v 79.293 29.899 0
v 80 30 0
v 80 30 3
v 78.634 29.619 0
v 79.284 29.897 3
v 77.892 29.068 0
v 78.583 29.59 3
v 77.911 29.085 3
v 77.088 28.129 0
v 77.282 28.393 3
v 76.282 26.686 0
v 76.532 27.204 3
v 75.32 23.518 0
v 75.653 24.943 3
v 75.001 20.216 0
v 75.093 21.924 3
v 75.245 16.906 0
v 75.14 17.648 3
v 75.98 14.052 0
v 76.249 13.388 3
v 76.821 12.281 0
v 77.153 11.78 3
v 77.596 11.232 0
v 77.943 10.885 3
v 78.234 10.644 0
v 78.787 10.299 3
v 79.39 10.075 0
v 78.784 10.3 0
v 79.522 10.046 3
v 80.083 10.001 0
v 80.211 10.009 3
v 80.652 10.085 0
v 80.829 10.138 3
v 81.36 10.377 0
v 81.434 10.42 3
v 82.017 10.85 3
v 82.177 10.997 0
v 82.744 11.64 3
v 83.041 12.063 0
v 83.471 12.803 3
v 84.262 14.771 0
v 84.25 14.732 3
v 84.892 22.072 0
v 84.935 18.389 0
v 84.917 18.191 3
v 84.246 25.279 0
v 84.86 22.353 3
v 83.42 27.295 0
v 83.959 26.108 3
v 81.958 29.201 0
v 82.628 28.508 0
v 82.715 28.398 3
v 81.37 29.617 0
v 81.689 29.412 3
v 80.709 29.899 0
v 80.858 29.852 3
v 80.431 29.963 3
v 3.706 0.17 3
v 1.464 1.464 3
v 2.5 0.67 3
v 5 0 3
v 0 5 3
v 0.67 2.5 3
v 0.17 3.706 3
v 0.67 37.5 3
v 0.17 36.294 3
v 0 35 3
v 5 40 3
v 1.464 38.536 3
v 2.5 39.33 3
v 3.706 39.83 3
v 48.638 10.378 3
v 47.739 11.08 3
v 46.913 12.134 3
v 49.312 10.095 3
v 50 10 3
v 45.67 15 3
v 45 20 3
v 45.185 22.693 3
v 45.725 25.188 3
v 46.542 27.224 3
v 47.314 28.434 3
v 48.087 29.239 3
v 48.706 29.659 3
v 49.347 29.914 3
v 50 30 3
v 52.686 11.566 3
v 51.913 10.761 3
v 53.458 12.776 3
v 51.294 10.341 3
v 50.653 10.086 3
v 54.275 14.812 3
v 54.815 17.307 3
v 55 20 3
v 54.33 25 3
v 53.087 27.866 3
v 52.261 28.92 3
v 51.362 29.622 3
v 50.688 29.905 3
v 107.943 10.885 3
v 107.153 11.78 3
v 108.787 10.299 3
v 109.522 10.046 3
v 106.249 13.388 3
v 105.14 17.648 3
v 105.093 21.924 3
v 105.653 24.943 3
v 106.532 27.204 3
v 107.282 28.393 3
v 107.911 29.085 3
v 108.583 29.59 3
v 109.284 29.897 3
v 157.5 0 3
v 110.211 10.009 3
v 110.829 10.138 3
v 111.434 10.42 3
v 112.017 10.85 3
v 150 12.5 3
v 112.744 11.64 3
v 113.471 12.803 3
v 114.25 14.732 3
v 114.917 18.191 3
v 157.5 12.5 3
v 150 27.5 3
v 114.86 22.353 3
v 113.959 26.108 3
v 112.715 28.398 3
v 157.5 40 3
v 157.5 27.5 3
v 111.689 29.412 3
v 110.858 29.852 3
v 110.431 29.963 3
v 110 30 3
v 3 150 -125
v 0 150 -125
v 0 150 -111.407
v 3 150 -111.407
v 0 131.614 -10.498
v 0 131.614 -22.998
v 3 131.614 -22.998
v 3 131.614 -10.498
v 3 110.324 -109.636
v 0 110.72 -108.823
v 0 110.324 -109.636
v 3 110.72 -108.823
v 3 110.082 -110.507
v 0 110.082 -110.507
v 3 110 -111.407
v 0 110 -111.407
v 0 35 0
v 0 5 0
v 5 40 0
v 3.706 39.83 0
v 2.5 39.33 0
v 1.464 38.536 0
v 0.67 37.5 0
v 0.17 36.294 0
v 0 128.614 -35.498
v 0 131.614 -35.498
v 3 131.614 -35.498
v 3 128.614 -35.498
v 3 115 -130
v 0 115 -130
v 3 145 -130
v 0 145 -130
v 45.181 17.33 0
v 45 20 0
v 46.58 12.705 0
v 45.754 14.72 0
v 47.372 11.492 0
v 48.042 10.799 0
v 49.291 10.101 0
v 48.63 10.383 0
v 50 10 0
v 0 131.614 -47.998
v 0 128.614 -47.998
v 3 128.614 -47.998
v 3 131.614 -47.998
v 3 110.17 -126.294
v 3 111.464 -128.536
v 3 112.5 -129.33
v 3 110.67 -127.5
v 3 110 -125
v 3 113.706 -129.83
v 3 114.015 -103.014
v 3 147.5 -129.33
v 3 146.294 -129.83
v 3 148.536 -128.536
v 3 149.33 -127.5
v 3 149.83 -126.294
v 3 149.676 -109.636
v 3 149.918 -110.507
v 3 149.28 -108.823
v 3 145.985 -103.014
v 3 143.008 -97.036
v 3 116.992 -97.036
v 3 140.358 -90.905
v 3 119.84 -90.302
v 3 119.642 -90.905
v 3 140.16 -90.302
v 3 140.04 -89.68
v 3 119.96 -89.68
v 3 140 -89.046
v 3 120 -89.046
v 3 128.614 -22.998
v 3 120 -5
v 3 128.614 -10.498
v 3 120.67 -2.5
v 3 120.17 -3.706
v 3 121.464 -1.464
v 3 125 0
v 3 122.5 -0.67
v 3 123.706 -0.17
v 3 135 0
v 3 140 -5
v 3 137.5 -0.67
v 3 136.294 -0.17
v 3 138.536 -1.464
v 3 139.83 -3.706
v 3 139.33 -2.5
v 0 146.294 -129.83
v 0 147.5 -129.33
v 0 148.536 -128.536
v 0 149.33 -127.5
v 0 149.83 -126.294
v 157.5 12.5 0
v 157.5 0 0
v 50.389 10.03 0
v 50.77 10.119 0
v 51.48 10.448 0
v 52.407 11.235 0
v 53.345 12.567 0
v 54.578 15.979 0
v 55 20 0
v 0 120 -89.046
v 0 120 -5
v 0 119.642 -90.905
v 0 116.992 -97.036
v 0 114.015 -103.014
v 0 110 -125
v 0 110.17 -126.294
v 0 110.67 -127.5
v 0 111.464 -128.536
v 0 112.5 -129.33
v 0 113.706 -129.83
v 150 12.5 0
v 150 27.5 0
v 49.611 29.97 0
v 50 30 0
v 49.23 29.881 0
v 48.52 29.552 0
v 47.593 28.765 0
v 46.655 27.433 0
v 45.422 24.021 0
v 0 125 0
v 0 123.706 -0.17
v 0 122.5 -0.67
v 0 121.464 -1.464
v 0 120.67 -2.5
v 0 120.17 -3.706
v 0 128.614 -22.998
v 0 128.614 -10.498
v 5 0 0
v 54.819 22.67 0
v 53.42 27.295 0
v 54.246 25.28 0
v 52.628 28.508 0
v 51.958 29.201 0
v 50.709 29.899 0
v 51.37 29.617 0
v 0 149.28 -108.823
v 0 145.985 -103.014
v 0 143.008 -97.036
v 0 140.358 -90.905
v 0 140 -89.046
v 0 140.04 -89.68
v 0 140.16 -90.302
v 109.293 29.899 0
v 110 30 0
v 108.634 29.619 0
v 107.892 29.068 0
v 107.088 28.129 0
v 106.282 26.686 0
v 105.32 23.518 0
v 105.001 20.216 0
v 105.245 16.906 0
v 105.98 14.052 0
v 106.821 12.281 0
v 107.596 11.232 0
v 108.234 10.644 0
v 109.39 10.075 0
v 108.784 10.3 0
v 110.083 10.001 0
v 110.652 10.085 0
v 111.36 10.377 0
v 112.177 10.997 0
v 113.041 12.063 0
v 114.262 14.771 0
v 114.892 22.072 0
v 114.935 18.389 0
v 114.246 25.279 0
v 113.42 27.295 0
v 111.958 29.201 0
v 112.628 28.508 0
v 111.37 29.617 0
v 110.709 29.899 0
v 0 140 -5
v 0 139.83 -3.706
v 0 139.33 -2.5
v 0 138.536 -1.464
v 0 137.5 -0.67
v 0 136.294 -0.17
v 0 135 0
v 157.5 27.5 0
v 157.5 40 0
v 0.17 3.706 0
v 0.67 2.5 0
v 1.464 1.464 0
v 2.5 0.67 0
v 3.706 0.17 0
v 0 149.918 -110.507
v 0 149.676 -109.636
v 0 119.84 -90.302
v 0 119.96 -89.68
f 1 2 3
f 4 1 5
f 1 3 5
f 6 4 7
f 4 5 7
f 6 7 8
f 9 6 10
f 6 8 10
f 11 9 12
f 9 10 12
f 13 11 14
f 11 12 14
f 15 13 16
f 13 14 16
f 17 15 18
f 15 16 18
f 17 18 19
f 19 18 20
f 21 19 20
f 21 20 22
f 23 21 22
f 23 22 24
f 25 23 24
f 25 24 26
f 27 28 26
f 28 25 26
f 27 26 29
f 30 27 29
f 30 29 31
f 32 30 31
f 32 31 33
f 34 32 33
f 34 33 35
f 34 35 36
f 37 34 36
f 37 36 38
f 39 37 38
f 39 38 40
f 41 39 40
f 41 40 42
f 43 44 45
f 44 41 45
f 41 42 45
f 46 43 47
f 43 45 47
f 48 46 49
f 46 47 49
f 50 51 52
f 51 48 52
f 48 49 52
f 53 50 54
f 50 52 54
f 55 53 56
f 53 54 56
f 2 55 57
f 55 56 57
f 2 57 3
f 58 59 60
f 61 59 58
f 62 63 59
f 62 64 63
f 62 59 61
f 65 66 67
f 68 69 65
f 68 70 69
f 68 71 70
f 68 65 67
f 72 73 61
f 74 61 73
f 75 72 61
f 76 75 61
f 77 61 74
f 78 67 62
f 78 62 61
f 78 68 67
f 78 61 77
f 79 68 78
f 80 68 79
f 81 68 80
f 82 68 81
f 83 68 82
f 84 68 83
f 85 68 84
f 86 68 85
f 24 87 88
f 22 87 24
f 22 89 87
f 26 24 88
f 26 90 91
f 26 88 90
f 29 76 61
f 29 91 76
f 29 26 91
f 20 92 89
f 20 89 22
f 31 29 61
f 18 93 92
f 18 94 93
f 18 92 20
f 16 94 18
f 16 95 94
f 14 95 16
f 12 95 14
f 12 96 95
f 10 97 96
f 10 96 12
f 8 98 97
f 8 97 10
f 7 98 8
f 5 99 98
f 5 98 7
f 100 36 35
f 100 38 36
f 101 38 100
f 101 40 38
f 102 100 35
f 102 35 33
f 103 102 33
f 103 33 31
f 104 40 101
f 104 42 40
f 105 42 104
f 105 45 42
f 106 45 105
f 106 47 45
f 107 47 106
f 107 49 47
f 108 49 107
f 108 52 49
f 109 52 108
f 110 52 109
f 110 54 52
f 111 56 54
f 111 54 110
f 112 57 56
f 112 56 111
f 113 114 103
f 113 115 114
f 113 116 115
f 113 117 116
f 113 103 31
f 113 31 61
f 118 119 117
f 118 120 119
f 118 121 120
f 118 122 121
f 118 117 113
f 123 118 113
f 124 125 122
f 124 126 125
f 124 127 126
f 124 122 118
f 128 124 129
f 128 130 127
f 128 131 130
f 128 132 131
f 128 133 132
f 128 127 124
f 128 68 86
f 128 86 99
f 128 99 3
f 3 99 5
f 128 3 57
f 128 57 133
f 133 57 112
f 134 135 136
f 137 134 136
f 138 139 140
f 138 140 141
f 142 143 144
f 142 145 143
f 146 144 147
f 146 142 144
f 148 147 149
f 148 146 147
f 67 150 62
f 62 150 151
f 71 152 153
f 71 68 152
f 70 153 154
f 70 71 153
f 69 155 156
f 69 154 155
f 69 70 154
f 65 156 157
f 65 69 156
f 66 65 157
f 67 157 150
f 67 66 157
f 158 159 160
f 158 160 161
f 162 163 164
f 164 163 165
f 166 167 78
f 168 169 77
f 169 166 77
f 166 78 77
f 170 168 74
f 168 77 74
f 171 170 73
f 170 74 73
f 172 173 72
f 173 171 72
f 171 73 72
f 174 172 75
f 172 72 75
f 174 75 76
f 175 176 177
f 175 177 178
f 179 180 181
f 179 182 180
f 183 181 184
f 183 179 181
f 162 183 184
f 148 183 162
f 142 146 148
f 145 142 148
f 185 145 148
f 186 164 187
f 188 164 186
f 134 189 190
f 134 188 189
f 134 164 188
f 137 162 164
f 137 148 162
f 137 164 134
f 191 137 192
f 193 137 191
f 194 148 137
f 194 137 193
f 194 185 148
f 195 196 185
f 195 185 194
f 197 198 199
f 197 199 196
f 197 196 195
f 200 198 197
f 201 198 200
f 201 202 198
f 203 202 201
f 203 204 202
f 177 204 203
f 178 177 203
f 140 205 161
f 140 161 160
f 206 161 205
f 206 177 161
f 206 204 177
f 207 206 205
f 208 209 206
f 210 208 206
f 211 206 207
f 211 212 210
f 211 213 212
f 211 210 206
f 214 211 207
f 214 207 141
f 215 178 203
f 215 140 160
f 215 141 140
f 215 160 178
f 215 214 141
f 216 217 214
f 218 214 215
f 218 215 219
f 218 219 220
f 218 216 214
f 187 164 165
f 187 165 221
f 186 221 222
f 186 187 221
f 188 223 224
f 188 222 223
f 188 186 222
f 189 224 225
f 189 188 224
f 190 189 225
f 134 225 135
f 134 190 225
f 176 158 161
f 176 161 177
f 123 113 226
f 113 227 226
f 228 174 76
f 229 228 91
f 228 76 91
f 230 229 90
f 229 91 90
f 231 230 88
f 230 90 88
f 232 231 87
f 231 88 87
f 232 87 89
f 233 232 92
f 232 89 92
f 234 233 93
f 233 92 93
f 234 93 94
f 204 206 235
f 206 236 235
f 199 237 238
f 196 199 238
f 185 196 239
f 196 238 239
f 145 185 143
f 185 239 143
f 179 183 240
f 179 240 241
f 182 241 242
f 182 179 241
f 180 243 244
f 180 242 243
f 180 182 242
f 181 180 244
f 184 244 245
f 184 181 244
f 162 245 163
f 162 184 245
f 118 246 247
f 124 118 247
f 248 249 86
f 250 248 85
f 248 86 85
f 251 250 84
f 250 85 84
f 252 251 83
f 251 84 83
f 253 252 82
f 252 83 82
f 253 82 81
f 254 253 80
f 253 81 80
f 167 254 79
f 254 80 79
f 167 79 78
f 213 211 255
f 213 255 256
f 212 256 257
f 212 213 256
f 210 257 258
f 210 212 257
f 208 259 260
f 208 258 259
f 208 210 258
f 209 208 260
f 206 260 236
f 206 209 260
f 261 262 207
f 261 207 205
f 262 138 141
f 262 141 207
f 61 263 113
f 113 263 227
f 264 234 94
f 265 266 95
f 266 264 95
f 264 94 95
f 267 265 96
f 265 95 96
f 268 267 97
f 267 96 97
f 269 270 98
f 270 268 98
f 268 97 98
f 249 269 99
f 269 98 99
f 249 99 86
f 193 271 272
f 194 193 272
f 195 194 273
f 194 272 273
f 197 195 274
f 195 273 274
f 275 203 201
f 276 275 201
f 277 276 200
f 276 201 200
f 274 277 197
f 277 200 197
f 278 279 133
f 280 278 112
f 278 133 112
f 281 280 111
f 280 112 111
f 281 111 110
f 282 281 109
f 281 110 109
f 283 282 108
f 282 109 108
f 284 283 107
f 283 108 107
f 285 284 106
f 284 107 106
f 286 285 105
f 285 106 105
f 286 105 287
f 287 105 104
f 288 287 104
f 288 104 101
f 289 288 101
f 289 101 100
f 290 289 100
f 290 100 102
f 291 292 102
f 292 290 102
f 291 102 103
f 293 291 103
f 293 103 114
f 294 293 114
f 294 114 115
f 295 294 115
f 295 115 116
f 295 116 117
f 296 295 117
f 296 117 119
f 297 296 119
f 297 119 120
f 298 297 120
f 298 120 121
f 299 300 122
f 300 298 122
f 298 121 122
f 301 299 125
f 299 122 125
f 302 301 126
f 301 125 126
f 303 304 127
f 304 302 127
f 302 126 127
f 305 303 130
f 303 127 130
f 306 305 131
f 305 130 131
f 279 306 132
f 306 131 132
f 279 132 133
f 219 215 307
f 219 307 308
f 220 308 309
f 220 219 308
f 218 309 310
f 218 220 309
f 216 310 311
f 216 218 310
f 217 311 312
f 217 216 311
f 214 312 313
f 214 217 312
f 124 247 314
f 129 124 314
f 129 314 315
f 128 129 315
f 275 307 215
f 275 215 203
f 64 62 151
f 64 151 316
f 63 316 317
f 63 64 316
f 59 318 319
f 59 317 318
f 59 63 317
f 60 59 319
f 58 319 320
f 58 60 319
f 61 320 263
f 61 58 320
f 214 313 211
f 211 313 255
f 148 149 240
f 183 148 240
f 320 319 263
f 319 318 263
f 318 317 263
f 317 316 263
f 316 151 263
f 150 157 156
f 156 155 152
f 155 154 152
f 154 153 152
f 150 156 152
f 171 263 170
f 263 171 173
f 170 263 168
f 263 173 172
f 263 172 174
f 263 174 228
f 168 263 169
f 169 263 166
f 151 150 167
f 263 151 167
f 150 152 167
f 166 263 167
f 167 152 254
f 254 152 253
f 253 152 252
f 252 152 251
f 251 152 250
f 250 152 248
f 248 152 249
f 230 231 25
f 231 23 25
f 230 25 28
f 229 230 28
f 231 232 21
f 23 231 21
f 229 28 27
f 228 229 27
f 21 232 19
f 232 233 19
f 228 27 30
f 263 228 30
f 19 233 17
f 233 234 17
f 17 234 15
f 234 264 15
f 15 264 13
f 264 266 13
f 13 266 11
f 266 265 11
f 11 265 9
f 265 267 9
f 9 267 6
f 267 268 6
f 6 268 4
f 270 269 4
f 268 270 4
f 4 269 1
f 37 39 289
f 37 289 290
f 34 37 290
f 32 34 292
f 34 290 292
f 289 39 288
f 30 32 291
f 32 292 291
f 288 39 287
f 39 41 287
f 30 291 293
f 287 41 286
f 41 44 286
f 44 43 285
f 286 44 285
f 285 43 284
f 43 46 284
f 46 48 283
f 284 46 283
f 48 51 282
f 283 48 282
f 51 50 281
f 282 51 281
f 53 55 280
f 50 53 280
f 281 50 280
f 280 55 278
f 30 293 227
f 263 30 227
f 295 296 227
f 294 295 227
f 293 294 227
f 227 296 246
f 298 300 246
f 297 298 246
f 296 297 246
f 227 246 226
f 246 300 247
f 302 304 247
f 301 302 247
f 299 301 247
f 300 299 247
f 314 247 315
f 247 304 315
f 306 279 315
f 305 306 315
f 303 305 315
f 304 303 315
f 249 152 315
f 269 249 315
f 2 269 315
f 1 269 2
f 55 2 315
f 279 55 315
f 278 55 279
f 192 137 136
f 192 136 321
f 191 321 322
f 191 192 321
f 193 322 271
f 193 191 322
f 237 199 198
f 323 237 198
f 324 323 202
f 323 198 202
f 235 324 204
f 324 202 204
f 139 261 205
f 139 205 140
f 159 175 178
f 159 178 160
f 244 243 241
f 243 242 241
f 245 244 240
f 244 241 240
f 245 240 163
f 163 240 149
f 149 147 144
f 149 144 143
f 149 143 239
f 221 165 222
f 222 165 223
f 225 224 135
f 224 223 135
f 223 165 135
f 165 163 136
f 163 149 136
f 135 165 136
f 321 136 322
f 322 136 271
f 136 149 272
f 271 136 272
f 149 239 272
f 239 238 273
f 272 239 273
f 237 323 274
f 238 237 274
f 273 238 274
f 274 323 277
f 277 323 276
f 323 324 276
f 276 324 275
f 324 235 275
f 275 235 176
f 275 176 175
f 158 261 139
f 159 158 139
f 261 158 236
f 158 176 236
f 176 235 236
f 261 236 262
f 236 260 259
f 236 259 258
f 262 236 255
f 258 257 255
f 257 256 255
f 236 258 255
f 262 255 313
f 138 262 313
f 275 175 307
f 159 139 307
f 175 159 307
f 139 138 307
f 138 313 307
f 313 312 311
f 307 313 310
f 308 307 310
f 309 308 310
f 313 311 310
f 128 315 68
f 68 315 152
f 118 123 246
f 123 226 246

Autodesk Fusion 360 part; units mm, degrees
sketch "Sketch1" plane through (0, 0, 0) normal (0, 0, 1) x (1, 0, 0)
  line L0 (65, 0) -> (157.5, 0)
  line L1 (157.5, 0) -> (157.5, 12.5)
  line L2 (157.5, 12.5) -> (150, 12.5)
  line L3 (150, 12.5) -> (150, 27.5)
  line L4 (150, 27.5) -> (157.5, 27.5)
  line L5 (157.5, 27.5) -> (157.5, 40)
  line L6 (157.5, 40) -> (0, 40)
  line L7 (0, 40) -> (0, 20)
  line L8 (0, 20) -> (0, 0)
  line L9 (0, 0) -> (65, 0)
  dimension "d1" = 157.5
  dimension "d2" = 12.5
  dimension "d3" = 7.5
  dimension "d4" = 15
  dimension "d5" = 7.5
  dimension "d6" = 12.5
extrude "Extrude1" add sketch "Sketch1" along normal blind 3 makes body 1
copy_body "Body->Comp1" bodies 1 removing the originals makes body 2 in component "Component"
sketch "Sketch3" plane through (0, 0, 0) normal (1, 0, 0) x (0, 1, 0)
  line L0 (150, 0) -> (110, 0)
  line L1 (110, 0) -> (110, -130)
  line L2 (110, -130) -> (150, -130)
  line L3 (150, -130) -> (150, 0)
  line L4 (131.6139, -10.4979) -> (128.6139, -10.4979)
  line L5 (128.6139, -10.4979) -> (128.6139, -22.9979)
  line L6 (128.6139, -22.9979) -> (131.6139, -22.9979)
  line L7 (131.6139, -22.9979) -> (131.6139, -10.4979)
  line L8 (128.6139, -35.4979) -> (128.6139, -47.9979)
  line L9 (128.6139, -47.9979) -> (131.6139, -47.9979)
  line L10 (131.6139, -47.9979) -> (131.6139, -35.4979)
  line L11 (131.6139, -35.4979) -> (128.6139, -35.4979)
  arc A0 (120, 0) -> (120, -90) centre (5, -45) ccw
  line L12 (120, 0) -> (120, -90)
  arc A1 (140, -90) -> (140, 0) centre (255, -45) ccw
  line L13 (140, 0) -> (140, -90)
  dimension "d9" = 40
  dimension "d10" = 130
  dimension "d11" = 3
  dimension "d12" = 12.5
  dimension "d15" = 0
  dimension "d16" = -25
extrude "Extrude3" add sketch "Sketch3" along normal blind 3 separate body contours L0 L1 L2 L3 A0 L12 A1 L13 makes body 3
copy_body "Body->Comp2" bodies 3 removing the originals makes body 4 in component "Component'"
sketch "Sketch4" plane through (0, 0, 3) normal (0, 0, 1) x (-1, 0, 0)
  line L0 (0, 0) -> (-157.5, 0)
  line L1 (-157.5, 0) -> (-157.5, -12.5)
  line L2 (-157.5, -12.5) -> (-150, -12.5)
  line L3 (-150, -12.5) -> (-150, -27.5)
  line L4 (-150, -27.5) -> (-157.5, -27.5)
  line L5 (-157.5, -27.5) -> (-157.5, -40)
  line L6 (-157.5, -40) -> (0, -40)
  line L7 (0, -40) -> (0, 0)
  ellipse E0 centre (-50, -20) end of major axis (-50, -30) minor radius 5
  line L8 (-50, -10) -> (-50, -30)
  line L9 (-55, -20) -> (-45, -20)
  ellipse E1 centre (-80, -20) end of major axis (-80, -30) minor radius 5
  ellipse E2 centre (-110, -20) end of major axis (-110, -30) minor radius 5
  dimension "d21" = 10
  dimension "d24" = -60
  dimension "d25" = 0
extrude "Extrude1'" cut sketch "Sketch4" against normal blind 10 contours E0 L8 L9 | E0 L8 L9 | E0 L8 L9 | E0 L8 L9 | E1 | E2 bodies 2 in component "Component"
fillet "Fillet1" radius 5 8 edges at (1.5, 120, 0) (1.5, 140, 0) (1.5, 140, -90) (1.5, 150, -110) (1.5, 150, -130) (1.5, 120, -90) (1.5, 110, -110) (1.5, 110, -130) on bodies 4 in component "Component'"
fillet "Fillet1'" radius 5 2 edges at (0, 40, 1.5) (0, 0, 1.5) on bodies 2 in component "Component"
component "Component" placed x (1, 0, 0) y (0, 1, 0) z (0, 0, 1) at (0, 0, 0)
component "Component'" placed x (1, 0, 0) y (0, 1, 0) z (0, 0, 1) at (0, 0, 0)
